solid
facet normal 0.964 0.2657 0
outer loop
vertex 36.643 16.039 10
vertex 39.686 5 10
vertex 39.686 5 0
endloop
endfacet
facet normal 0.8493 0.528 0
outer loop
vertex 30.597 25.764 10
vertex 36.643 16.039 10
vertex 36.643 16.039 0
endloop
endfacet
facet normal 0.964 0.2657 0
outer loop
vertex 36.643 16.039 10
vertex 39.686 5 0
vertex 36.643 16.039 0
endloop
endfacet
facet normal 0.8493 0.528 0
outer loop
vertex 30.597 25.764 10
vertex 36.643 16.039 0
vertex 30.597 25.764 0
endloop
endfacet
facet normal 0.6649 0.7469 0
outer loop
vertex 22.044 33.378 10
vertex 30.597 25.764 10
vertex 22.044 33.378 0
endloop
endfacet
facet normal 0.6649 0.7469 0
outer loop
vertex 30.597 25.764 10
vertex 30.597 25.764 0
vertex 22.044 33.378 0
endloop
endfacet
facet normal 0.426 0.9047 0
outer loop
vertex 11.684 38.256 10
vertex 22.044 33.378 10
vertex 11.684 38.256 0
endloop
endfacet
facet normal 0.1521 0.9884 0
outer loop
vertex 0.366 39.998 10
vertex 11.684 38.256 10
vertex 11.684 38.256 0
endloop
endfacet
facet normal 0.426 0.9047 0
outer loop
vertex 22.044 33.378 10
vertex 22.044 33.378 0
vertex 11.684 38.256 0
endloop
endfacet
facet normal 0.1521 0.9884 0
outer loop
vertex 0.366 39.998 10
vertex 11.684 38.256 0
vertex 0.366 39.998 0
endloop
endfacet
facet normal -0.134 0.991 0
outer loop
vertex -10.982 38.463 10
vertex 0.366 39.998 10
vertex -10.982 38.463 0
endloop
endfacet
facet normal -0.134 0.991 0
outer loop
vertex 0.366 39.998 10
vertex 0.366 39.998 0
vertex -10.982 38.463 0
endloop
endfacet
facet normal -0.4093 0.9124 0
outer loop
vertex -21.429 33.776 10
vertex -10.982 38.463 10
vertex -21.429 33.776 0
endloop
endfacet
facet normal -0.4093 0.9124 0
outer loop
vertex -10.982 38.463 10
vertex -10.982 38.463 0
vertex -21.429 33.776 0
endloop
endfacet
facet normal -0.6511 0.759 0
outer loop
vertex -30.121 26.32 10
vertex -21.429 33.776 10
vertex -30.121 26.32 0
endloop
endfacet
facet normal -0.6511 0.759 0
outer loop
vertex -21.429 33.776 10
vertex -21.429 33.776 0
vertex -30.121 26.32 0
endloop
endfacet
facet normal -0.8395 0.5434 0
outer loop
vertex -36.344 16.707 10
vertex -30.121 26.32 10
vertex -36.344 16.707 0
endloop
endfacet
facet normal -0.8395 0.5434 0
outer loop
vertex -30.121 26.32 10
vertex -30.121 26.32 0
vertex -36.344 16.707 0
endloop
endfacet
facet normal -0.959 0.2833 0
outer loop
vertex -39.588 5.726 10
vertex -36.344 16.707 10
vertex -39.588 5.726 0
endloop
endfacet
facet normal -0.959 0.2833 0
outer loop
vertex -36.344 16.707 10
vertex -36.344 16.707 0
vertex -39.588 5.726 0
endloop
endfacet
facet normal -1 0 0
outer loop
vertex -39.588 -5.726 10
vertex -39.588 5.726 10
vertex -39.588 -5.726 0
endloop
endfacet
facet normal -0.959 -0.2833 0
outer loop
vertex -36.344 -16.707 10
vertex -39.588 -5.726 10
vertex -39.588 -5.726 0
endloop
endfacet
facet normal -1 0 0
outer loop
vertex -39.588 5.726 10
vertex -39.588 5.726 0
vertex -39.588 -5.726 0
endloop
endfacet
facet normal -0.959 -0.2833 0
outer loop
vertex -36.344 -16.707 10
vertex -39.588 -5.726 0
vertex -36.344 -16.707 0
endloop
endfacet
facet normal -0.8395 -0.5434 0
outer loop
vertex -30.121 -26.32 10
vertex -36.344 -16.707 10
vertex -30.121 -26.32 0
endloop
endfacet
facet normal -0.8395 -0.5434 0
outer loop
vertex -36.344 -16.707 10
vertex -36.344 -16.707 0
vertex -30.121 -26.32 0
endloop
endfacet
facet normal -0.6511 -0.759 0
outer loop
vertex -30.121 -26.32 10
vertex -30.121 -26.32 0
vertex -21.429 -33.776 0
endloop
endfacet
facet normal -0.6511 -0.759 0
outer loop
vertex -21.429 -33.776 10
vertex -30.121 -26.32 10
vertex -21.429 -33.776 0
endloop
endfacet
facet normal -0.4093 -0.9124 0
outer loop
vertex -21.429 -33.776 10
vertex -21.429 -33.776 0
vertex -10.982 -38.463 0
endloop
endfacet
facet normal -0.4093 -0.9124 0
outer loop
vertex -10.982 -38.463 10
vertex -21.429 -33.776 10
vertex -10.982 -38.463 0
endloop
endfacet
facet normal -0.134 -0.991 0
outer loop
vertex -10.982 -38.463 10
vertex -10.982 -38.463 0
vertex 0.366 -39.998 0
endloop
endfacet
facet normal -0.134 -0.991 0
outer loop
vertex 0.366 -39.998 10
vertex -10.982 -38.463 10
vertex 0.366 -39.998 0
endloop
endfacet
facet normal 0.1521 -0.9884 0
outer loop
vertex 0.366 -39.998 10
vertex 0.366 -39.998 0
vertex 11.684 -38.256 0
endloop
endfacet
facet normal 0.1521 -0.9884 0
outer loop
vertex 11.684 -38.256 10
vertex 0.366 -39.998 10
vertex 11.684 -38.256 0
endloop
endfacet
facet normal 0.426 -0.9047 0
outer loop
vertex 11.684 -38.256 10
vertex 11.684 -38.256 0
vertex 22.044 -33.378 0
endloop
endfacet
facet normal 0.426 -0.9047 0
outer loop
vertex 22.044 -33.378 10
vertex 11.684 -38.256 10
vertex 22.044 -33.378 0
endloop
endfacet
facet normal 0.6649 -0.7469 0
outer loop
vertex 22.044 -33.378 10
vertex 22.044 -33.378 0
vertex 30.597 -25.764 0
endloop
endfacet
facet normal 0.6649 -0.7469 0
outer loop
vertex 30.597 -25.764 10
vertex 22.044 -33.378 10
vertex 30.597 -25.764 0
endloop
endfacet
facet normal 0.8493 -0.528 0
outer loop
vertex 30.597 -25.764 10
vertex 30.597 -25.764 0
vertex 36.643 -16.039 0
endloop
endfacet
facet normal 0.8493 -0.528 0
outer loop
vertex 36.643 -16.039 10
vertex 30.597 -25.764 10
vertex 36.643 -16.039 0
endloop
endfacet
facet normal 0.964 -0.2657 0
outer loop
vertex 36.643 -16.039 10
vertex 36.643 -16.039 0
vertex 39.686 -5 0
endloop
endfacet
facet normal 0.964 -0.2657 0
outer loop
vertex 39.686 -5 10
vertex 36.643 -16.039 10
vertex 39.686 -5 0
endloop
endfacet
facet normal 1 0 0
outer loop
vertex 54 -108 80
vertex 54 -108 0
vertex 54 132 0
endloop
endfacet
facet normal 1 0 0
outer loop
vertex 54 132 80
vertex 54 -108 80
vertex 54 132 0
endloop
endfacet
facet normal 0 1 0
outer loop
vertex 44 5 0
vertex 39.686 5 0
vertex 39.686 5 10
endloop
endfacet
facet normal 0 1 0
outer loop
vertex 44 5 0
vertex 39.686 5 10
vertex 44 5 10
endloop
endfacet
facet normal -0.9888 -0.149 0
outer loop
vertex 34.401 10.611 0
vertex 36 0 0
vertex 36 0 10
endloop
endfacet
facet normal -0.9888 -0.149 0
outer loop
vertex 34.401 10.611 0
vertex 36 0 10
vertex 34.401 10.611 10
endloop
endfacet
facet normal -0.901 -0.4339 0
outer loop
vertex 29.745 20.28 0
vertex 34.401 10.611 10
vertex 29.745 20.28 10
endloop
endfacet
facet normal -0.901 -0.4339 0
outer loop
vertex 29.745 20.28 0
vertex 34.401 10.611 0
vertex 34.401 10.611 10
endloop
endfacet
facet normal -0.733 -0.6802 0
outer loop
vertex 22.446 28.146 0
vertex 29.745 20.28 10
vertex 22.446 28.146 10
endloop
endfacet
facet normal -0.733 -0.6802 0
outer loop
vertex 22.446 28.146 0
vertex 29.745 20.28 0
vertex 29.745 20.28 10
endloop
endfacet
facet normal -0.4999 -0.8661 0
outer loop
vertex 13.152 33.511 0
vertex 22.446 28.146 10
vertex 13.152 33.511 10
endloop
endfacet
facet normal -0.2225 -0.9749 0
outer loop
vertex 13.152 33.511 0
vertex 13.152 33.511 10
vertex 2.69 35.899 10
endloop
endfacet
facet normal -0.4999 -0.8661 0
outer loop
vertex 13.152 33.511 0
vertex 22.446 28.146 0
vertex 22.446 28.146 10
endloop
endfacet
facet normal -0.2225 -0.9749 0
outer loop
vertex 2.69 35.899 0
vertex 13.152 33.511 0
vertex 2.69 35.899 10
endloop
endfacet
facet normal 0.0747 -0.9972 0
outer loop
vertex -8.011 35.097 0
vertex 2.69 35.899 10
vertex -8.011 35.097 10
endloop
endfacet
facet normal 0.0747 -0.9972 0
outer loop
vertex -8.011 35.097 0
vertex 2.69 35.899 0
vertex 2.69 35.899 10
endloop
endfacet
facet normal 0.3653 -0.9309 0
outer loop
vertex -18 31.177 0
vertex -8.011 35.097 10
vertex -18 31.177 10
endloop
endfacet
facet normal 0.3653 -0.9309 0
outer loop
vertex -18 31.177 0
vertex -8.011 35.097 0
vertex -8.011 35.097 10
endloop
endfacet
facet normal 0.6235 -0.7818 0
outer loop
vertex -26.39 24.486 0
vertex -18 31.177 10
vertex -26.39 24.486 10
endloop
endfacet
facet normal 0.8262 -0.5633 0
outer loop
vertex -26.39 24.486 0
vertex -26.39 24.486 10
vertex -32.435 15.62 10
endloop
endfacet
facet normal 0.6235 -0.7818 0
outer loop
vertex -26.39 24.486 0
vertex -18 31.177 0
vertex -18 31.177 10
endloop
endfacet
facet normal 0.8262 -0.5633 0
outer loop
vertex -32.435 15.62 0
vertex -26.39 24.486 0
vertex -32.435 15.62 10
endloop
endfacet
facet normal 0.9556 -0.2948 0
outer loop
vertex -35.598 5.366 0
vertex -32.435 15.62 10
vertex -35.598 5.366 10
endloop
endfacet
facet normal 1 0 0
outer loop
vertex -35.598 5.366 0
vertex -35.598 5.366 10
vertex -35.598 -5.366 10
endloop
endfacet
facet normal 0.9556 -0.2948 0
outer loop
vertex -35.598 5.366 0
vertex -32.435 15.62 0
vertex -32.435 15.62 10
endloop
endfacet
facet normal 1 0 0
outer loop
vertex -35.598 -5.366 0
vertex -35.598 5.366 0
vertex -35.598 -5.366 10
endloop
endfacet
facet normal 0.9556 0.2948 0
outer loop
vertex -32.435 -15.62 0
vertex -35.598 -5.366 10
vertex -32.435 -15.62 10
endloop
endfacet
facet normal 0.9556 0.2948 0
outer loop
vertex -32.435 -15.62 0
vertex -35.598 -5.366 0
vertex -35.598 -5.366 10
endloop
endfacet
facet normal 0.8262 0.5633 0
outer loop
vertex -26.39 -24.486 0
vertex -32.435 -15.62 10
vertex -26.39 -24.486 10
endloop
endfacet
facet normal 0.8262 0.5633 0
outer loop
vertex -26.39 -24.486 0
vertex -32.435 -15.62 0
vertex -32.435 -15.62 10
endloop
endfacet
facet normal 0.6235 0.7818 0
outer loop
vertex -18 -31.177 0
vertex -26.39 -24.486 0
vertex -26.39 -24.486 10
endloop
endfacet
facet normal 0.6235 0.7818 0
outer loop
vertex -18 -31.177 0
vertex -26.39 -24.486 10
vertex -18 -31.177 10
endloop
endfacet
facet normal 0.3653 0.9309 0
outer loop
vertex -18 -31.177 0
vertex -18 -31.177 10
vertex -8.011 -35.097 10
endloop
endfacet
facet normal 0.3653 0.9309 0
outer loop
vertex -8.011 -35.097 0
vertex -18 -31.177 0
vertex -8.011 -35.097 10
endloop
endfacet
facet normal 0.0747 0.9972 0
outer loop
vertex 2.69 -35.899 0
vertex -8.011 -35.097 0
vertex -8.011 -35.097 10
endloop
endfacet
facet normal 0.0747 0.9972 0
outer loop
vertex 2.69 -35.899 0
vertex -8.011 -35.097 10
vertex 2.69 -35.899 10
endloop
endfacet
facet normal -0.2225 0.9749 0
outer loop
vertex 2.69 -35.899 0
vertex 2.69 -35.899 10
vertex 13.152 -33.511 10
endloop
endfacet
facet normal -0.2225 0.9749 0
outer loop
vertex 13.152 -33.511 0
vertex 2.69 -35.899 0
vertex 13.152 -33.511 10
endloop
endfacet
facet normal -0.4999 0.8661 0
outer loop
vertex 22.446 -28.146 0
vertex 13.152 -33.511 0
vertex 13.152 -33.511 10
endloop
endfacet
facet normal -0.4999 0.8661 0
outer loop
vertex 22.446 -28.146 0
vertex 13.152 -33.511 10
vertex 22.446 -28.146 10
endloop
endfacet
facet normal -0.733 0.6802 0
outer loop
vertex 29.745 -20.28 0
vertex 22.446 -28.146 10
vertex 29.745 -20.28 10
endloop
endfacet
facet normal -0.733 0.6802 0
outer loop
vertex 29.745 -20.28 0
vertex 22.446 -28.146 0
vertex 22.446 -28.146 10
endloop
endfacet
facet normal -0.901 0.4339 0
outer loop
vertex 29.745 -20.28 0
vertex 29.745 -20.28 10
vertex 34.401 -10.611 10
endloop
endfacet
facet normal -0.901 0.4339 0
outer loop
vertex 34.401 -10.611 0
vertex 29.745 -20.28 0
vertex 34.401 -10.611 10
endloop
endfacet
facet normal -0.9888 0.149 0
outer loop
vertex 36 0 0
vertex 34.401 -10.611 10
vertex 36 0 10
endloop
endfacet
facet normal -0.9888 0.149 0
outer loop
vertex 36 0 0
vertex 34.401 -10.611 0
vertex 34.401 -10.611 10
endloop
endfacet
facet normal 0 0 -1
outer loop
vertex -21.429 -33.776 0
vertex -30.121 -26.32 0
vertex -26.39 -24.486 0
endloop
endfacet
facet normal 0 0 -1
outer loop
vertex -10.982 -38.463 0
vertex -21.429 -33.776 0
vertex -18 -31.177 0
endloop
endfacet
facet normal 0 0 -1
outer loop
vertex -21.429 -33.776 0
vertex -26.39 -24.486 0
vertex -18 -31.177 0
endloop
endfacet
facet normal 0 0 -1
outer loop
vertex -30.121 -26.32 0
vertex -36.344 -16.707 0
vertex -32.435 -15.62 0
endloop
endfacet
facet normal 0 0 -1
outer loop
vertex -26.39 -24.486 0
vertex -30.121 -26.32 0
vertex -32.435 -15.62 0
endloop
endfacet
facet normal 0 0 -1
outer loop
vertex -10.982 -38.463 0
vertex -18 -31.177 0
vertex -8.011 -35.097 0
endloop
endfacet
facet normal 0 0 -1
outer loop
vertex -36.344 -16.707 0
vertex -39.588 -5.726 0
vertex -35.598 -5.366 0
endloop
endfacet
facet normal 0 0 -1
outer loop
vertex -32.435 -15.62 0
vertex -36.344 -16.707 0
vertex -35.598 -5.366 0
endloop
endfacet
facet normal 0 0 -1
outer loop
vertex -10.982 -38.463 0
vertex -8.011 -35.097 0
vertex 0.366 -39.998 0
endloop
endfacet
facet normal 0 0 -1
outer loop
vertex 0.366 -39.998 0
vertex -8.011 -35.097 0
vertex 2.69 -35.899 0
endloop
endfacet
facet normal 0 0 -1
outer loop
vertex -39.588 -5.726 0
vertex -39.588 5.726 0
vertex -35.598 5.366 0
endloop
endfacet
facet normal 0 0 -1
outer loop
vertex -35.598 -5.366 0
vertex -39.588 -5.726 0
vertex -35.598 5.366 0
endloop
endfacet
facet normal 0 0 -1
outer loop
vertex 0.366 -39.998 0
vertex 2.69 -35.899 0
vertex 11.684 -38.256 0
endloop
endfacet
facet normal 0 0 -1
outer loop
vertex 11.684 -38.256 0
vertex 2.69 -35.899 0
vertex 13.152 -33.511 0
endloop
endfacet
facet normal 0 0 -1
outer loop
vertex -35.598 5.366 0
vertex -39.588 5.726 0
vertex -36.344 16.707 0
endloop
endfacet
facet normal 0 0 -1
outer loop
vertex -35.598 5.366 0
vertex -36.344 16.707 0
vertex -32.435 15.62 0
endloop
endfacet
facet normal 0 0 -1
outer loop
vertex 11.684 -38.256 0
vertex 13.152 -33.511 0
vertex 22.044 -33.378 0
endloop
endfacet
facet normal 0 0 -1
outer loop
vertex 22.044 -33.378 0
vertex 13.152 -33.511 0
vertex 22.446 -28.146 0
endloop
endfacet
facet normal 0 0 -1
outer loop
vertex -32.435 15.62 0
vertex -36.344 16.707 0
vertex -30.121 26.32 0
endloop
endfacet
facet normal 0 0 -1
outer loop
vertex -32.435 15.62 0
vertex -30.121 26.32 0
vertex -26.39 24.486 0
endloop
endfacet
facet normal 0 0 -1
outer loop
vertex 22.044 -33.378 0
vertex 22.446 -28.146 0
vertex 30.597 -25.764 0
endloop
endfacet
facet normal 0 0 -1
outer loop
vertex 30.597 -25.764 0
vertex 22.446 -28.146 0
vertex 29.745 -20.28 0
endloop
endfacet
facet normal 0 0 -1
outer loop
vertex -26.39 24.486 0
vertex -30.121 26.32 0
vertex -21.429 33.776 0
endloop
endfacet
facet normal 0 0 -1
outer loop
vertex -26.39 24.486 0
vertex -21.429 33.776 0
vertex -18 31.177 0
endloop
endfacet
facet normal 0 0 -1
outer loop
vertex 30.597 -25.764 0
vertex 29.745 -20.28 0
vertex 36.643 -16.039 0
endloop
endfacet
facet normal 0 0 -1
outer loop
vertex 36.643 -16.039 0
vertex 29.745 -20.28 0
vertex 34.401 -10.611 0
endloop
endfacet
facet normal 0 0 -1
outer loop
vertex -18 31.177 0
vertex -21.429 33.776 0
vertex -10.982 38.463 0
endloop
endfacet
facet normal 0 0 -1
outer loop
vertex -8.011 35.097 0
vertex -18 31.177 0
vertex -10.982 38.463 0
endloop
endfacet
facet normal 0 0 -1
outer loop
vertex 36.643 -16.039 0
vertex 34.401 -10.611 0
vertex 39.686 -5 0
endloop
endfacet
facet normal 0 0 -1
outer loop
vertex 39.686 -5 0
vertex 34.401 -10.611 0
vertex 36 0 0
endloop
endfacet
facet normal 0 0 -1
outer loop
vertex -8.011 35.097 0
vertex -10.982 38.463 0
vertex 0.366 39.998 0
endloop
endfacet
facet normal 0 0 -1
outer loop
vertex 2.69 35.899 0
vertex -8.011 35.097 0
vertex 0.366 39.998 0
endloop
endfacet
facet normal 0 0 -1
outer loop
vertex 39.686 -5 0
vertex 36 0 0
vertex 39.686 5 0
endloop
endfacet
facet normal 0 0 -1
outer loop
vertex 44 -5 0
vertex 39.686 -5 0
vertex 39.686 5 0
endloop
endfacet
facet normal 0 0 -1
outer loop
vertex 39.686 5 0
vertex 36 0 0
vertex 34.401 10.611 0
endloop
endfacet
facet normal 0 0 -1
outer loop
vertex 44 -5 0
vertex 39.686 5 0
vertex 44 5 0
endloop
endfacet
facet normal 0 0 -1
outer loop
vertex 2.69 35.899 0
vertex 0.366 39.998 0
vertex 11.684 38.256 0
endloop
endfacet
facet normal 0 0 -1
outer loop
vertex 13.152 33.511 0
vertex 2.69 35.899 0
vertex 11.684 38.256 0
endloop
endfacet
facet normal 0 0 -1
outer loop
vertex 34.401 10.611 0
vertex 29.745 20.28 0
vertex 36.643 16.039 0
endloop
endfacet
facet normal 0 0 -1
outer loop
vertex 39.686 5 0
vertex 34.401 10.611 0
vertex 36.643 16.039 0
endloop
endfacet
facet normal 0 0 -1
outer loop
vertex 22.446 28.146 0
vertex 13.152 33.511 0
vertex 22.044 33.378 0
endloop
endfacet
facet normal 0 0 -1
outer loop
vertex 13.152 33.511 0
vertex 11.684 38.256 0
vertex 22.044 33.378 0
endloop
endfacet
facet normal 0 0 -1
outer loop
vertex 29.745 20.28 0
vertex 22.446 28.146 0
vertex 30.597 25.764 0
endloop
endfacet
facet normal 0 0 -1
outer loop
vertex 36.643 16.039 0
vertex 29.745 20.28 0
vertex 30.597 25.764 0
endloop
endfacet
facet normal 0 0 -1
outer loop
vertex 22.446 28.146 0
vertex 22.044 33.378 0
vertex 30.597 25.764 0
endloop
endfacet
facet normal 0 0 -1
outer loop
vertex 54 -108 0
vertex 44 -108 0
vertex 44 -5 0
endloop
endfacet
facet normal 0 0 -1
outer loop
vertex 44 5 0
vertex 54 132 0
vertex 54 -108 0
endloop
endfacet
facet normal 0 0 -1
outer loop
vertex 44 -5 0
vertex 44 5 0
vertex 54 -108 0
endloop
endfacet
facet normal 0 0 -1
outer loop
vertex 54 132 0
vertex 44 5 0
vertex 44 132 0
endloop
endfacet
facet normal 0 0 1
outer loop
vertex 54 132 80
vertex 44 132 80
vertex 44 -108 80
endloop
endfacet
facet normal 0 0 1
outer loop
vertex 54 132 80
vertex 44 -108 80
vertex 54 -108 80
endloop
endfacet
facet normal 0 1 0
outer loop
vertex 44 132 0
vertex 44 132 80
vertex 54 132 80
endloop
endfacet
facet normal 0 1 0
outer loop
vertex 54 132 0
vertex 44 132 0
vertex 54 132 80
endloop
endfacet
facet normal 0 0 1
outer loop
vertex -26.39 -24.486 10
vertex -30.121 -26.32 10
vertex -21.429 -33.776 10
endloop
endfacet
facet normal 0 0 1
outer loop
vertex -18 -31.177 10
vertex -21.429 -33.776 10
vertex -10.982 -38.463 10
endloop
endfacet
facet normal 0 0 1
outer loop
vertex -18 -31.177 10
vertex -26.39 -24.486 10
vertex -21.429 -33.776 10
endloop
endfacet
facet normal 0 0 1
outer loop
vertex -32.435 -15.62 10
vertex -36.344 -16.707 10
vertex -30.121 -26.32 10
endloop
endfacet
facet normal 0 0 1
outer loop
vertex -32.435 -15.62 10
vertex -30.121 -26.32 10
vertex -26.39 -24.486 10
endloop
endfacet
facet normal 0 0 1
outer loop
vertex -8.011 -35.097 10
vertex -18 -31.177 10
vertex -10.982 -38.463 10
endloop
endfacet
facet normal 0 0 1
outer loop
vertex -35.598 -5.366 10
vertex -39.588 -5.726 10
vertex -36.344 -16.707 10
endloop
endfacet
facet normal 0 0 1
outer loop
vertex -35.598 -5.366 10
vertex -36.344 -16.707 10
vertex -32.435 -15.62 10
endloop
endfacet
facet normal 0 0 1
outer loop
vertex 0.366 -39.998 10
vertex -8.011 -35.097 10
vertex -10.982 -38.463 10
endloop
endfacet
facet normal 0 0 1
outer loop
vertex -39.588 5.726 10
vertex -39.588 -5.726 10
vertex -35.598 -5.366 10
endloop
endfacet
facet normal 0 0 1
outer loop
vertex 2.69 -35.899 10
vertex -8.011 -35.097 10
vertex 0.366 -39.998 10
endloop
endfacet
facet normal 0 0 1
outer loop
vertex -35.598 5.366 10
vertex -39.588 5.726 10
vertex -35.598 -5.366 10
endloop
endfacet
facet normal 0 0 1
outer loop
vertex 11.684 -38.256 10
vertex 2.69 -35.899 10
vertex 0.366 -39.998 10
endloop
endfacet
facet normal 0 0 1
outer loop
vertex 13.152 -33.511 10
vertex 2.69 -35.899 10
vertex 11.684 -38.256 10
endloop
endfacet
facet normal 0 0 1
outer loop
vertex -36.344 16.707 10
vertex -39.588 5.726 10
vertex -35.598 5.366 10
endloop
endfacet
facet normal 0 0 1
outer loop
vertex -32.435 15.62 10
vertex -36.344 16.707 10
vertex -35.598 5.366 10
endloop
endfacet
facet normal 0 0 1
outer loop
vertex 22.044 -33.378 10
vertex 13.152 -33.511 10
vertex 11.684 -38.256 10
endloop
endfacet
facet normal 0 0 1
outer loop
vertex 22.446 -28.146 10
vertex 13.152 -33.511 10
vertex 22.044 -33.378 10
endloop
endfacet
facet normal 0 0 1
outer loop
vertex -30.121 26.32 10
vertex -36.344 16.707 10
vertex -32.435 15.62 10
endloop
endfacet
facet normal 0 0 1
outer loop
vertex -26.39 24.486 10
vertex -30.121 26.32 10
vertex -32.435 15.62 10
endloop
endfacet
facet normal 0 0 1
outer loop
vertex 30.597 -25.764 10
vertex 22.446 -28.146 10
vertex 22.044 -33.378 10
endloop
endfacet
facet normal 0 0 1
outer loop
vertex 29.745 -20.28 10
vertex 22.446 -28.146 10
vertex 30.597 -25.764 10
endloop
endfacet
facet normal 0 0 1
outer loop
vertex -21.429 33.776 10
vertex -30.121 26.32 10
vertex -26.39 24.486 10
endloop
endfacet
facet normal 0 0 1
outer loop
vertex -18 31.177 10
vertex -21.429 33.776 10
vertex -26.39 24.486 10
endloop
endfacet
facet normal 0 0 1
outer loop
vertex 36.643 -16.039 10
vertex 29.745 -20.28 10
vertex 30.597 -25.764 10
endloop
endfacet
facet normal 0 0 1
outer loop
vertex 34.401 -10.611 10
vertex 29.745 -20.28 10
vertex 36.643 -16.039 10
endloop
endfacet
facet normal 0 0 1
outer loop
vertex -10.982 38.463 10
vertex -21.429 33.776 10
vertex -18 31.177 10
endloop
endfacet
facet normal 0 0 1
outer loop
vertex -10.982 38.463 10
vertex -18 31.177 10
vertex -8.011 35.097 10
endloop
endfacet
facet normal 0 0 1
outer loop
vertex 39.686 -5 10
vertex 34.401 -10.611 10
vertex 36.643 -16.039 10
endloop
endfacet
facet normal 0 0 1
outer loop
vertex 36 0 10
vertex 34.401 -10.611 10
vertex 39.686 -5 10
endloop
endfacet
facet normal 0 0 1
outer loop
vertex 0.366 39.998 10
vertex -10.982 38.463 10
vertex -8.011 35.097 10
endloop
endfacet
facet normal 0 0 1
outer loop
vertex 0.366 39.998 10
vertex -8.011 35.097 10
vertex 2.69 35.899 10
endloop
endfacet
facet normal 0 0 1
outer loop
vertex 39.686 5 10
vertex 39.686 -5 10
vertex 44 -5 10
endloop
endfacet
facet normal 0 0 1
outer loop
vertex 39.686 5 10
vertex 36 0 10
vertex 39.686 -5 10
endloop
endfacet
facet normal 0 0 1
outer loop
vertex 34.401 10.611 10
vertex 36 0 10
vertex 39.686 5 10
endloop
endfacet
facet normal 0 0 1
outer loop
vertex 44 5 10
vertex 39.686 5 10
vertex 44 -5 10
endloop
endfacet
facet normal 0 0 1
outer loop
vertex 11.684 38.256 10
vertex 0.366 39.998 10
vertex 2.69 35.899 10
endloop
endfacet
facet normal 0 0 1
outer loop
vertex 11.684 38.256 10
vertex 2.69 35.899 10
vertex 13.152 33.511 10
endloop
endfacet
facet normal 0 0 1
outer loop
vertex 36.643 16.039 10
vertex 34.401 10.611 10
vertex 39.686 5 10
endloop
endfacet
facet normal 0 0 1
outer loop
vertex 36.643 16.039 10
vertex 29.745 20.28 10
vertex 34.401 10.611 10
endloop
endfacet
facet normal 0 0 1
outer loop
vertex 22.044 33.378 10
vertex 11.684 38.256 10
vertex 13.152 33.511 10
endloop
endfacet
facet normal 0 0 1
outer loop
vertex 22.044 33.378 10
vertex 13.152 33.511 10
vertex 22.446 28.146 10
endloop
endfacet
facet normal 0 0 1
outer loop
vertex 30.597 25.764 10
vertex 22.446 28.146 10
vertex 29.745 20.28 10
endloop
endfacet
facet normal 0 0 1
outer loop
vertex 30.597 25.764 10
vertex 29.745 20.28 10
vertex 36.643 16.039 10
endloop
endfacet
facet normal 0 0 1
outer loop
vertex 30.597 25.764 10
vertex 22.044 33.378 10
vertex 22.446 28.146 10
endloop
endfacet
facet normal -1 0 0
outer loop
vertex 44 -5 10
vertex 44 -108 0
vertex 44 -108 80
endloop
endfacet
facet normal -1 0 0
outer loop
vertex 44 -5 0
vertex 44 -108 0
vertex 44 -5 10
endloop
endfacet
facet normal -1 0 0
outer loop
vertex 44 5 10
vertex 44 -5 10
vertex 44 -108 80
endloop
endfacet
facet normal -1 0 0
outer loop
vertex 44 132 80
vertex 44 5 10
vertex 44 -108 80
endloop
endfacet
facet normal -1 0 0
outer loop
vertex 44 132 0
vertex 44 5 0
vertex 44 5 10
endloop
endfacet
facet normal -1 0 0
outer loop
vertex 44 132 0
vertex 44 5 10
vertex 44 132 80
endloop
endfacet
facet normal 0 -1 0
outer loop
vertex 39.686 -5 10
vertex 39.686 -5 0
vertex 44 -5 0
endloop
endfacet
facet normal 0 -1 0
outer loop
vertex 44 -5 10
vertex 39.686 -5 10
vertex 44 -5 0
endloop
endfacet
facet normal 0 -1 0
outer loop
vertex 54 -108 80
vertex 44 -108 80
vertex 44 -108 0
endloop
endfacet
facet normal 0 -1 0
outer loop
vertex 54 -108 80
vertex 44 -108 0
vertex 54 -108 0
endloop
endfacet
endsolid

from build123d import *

# Parameters (mm, degrees)
BOX_W             = 10
BOX_H             = 10
BOX_DEPTH         = 10
BOX001_W          = 10
BOX001_H          = 240
BOX001_DEPTH      = 80
CYLINDER001_R     = 36
CYLINDER001_DEPTH = 10
CYLINDER_R        = 40
CYLINDER_DEPTH    = 10


with BuildPart() as cube:
    # Box → Box (new body)
    with BuildSketch(Plane(origin=(38, -5, 0), x_dir=(1, 0, 0), z_dir=(0, 0, 1))):
        with Locations((5, 5)):
            Rectangle(BOX_W, BOX_H)
    extrude(amount=BOX_DEPTH)


with BuildPart() as cube001:
    # Box001 → Box001 (new body)
    with BuildSketch(Plane(origin=(44, -108, 0), x_dir=(1, 0, 0), z_dir=(0, 0, 1))):
        with Locations((5, 120)):
            Rectangle(BOX001_W, BOX001_H)
    extrude(amount=BOX001_DEPTH)


with BuildPart() as cylinder001:
    # Cylinder001 → Cylinder001 (new body)
    with BuildSketch(Plane.XY):
        Circle(CYLINDER001_R)
    extrude(amount=CYLINDER001_DEPTH)


with BuildPart() as fusion:
    # Cylinder → Cylinder (new body)
    with BuildSketch(Plane.XY):
        Circle(CYLINDER_R)
    extrude(amount=CYLINDER_DEPTH)

    # Cut: cut Cylinder001
    add(cylinder001.part, mode=Mode.SUBTRACT)

    # Fusion: union Cube, Cube001
    add(cube.part)
    add(cube001.part)


solid = fusion.part
